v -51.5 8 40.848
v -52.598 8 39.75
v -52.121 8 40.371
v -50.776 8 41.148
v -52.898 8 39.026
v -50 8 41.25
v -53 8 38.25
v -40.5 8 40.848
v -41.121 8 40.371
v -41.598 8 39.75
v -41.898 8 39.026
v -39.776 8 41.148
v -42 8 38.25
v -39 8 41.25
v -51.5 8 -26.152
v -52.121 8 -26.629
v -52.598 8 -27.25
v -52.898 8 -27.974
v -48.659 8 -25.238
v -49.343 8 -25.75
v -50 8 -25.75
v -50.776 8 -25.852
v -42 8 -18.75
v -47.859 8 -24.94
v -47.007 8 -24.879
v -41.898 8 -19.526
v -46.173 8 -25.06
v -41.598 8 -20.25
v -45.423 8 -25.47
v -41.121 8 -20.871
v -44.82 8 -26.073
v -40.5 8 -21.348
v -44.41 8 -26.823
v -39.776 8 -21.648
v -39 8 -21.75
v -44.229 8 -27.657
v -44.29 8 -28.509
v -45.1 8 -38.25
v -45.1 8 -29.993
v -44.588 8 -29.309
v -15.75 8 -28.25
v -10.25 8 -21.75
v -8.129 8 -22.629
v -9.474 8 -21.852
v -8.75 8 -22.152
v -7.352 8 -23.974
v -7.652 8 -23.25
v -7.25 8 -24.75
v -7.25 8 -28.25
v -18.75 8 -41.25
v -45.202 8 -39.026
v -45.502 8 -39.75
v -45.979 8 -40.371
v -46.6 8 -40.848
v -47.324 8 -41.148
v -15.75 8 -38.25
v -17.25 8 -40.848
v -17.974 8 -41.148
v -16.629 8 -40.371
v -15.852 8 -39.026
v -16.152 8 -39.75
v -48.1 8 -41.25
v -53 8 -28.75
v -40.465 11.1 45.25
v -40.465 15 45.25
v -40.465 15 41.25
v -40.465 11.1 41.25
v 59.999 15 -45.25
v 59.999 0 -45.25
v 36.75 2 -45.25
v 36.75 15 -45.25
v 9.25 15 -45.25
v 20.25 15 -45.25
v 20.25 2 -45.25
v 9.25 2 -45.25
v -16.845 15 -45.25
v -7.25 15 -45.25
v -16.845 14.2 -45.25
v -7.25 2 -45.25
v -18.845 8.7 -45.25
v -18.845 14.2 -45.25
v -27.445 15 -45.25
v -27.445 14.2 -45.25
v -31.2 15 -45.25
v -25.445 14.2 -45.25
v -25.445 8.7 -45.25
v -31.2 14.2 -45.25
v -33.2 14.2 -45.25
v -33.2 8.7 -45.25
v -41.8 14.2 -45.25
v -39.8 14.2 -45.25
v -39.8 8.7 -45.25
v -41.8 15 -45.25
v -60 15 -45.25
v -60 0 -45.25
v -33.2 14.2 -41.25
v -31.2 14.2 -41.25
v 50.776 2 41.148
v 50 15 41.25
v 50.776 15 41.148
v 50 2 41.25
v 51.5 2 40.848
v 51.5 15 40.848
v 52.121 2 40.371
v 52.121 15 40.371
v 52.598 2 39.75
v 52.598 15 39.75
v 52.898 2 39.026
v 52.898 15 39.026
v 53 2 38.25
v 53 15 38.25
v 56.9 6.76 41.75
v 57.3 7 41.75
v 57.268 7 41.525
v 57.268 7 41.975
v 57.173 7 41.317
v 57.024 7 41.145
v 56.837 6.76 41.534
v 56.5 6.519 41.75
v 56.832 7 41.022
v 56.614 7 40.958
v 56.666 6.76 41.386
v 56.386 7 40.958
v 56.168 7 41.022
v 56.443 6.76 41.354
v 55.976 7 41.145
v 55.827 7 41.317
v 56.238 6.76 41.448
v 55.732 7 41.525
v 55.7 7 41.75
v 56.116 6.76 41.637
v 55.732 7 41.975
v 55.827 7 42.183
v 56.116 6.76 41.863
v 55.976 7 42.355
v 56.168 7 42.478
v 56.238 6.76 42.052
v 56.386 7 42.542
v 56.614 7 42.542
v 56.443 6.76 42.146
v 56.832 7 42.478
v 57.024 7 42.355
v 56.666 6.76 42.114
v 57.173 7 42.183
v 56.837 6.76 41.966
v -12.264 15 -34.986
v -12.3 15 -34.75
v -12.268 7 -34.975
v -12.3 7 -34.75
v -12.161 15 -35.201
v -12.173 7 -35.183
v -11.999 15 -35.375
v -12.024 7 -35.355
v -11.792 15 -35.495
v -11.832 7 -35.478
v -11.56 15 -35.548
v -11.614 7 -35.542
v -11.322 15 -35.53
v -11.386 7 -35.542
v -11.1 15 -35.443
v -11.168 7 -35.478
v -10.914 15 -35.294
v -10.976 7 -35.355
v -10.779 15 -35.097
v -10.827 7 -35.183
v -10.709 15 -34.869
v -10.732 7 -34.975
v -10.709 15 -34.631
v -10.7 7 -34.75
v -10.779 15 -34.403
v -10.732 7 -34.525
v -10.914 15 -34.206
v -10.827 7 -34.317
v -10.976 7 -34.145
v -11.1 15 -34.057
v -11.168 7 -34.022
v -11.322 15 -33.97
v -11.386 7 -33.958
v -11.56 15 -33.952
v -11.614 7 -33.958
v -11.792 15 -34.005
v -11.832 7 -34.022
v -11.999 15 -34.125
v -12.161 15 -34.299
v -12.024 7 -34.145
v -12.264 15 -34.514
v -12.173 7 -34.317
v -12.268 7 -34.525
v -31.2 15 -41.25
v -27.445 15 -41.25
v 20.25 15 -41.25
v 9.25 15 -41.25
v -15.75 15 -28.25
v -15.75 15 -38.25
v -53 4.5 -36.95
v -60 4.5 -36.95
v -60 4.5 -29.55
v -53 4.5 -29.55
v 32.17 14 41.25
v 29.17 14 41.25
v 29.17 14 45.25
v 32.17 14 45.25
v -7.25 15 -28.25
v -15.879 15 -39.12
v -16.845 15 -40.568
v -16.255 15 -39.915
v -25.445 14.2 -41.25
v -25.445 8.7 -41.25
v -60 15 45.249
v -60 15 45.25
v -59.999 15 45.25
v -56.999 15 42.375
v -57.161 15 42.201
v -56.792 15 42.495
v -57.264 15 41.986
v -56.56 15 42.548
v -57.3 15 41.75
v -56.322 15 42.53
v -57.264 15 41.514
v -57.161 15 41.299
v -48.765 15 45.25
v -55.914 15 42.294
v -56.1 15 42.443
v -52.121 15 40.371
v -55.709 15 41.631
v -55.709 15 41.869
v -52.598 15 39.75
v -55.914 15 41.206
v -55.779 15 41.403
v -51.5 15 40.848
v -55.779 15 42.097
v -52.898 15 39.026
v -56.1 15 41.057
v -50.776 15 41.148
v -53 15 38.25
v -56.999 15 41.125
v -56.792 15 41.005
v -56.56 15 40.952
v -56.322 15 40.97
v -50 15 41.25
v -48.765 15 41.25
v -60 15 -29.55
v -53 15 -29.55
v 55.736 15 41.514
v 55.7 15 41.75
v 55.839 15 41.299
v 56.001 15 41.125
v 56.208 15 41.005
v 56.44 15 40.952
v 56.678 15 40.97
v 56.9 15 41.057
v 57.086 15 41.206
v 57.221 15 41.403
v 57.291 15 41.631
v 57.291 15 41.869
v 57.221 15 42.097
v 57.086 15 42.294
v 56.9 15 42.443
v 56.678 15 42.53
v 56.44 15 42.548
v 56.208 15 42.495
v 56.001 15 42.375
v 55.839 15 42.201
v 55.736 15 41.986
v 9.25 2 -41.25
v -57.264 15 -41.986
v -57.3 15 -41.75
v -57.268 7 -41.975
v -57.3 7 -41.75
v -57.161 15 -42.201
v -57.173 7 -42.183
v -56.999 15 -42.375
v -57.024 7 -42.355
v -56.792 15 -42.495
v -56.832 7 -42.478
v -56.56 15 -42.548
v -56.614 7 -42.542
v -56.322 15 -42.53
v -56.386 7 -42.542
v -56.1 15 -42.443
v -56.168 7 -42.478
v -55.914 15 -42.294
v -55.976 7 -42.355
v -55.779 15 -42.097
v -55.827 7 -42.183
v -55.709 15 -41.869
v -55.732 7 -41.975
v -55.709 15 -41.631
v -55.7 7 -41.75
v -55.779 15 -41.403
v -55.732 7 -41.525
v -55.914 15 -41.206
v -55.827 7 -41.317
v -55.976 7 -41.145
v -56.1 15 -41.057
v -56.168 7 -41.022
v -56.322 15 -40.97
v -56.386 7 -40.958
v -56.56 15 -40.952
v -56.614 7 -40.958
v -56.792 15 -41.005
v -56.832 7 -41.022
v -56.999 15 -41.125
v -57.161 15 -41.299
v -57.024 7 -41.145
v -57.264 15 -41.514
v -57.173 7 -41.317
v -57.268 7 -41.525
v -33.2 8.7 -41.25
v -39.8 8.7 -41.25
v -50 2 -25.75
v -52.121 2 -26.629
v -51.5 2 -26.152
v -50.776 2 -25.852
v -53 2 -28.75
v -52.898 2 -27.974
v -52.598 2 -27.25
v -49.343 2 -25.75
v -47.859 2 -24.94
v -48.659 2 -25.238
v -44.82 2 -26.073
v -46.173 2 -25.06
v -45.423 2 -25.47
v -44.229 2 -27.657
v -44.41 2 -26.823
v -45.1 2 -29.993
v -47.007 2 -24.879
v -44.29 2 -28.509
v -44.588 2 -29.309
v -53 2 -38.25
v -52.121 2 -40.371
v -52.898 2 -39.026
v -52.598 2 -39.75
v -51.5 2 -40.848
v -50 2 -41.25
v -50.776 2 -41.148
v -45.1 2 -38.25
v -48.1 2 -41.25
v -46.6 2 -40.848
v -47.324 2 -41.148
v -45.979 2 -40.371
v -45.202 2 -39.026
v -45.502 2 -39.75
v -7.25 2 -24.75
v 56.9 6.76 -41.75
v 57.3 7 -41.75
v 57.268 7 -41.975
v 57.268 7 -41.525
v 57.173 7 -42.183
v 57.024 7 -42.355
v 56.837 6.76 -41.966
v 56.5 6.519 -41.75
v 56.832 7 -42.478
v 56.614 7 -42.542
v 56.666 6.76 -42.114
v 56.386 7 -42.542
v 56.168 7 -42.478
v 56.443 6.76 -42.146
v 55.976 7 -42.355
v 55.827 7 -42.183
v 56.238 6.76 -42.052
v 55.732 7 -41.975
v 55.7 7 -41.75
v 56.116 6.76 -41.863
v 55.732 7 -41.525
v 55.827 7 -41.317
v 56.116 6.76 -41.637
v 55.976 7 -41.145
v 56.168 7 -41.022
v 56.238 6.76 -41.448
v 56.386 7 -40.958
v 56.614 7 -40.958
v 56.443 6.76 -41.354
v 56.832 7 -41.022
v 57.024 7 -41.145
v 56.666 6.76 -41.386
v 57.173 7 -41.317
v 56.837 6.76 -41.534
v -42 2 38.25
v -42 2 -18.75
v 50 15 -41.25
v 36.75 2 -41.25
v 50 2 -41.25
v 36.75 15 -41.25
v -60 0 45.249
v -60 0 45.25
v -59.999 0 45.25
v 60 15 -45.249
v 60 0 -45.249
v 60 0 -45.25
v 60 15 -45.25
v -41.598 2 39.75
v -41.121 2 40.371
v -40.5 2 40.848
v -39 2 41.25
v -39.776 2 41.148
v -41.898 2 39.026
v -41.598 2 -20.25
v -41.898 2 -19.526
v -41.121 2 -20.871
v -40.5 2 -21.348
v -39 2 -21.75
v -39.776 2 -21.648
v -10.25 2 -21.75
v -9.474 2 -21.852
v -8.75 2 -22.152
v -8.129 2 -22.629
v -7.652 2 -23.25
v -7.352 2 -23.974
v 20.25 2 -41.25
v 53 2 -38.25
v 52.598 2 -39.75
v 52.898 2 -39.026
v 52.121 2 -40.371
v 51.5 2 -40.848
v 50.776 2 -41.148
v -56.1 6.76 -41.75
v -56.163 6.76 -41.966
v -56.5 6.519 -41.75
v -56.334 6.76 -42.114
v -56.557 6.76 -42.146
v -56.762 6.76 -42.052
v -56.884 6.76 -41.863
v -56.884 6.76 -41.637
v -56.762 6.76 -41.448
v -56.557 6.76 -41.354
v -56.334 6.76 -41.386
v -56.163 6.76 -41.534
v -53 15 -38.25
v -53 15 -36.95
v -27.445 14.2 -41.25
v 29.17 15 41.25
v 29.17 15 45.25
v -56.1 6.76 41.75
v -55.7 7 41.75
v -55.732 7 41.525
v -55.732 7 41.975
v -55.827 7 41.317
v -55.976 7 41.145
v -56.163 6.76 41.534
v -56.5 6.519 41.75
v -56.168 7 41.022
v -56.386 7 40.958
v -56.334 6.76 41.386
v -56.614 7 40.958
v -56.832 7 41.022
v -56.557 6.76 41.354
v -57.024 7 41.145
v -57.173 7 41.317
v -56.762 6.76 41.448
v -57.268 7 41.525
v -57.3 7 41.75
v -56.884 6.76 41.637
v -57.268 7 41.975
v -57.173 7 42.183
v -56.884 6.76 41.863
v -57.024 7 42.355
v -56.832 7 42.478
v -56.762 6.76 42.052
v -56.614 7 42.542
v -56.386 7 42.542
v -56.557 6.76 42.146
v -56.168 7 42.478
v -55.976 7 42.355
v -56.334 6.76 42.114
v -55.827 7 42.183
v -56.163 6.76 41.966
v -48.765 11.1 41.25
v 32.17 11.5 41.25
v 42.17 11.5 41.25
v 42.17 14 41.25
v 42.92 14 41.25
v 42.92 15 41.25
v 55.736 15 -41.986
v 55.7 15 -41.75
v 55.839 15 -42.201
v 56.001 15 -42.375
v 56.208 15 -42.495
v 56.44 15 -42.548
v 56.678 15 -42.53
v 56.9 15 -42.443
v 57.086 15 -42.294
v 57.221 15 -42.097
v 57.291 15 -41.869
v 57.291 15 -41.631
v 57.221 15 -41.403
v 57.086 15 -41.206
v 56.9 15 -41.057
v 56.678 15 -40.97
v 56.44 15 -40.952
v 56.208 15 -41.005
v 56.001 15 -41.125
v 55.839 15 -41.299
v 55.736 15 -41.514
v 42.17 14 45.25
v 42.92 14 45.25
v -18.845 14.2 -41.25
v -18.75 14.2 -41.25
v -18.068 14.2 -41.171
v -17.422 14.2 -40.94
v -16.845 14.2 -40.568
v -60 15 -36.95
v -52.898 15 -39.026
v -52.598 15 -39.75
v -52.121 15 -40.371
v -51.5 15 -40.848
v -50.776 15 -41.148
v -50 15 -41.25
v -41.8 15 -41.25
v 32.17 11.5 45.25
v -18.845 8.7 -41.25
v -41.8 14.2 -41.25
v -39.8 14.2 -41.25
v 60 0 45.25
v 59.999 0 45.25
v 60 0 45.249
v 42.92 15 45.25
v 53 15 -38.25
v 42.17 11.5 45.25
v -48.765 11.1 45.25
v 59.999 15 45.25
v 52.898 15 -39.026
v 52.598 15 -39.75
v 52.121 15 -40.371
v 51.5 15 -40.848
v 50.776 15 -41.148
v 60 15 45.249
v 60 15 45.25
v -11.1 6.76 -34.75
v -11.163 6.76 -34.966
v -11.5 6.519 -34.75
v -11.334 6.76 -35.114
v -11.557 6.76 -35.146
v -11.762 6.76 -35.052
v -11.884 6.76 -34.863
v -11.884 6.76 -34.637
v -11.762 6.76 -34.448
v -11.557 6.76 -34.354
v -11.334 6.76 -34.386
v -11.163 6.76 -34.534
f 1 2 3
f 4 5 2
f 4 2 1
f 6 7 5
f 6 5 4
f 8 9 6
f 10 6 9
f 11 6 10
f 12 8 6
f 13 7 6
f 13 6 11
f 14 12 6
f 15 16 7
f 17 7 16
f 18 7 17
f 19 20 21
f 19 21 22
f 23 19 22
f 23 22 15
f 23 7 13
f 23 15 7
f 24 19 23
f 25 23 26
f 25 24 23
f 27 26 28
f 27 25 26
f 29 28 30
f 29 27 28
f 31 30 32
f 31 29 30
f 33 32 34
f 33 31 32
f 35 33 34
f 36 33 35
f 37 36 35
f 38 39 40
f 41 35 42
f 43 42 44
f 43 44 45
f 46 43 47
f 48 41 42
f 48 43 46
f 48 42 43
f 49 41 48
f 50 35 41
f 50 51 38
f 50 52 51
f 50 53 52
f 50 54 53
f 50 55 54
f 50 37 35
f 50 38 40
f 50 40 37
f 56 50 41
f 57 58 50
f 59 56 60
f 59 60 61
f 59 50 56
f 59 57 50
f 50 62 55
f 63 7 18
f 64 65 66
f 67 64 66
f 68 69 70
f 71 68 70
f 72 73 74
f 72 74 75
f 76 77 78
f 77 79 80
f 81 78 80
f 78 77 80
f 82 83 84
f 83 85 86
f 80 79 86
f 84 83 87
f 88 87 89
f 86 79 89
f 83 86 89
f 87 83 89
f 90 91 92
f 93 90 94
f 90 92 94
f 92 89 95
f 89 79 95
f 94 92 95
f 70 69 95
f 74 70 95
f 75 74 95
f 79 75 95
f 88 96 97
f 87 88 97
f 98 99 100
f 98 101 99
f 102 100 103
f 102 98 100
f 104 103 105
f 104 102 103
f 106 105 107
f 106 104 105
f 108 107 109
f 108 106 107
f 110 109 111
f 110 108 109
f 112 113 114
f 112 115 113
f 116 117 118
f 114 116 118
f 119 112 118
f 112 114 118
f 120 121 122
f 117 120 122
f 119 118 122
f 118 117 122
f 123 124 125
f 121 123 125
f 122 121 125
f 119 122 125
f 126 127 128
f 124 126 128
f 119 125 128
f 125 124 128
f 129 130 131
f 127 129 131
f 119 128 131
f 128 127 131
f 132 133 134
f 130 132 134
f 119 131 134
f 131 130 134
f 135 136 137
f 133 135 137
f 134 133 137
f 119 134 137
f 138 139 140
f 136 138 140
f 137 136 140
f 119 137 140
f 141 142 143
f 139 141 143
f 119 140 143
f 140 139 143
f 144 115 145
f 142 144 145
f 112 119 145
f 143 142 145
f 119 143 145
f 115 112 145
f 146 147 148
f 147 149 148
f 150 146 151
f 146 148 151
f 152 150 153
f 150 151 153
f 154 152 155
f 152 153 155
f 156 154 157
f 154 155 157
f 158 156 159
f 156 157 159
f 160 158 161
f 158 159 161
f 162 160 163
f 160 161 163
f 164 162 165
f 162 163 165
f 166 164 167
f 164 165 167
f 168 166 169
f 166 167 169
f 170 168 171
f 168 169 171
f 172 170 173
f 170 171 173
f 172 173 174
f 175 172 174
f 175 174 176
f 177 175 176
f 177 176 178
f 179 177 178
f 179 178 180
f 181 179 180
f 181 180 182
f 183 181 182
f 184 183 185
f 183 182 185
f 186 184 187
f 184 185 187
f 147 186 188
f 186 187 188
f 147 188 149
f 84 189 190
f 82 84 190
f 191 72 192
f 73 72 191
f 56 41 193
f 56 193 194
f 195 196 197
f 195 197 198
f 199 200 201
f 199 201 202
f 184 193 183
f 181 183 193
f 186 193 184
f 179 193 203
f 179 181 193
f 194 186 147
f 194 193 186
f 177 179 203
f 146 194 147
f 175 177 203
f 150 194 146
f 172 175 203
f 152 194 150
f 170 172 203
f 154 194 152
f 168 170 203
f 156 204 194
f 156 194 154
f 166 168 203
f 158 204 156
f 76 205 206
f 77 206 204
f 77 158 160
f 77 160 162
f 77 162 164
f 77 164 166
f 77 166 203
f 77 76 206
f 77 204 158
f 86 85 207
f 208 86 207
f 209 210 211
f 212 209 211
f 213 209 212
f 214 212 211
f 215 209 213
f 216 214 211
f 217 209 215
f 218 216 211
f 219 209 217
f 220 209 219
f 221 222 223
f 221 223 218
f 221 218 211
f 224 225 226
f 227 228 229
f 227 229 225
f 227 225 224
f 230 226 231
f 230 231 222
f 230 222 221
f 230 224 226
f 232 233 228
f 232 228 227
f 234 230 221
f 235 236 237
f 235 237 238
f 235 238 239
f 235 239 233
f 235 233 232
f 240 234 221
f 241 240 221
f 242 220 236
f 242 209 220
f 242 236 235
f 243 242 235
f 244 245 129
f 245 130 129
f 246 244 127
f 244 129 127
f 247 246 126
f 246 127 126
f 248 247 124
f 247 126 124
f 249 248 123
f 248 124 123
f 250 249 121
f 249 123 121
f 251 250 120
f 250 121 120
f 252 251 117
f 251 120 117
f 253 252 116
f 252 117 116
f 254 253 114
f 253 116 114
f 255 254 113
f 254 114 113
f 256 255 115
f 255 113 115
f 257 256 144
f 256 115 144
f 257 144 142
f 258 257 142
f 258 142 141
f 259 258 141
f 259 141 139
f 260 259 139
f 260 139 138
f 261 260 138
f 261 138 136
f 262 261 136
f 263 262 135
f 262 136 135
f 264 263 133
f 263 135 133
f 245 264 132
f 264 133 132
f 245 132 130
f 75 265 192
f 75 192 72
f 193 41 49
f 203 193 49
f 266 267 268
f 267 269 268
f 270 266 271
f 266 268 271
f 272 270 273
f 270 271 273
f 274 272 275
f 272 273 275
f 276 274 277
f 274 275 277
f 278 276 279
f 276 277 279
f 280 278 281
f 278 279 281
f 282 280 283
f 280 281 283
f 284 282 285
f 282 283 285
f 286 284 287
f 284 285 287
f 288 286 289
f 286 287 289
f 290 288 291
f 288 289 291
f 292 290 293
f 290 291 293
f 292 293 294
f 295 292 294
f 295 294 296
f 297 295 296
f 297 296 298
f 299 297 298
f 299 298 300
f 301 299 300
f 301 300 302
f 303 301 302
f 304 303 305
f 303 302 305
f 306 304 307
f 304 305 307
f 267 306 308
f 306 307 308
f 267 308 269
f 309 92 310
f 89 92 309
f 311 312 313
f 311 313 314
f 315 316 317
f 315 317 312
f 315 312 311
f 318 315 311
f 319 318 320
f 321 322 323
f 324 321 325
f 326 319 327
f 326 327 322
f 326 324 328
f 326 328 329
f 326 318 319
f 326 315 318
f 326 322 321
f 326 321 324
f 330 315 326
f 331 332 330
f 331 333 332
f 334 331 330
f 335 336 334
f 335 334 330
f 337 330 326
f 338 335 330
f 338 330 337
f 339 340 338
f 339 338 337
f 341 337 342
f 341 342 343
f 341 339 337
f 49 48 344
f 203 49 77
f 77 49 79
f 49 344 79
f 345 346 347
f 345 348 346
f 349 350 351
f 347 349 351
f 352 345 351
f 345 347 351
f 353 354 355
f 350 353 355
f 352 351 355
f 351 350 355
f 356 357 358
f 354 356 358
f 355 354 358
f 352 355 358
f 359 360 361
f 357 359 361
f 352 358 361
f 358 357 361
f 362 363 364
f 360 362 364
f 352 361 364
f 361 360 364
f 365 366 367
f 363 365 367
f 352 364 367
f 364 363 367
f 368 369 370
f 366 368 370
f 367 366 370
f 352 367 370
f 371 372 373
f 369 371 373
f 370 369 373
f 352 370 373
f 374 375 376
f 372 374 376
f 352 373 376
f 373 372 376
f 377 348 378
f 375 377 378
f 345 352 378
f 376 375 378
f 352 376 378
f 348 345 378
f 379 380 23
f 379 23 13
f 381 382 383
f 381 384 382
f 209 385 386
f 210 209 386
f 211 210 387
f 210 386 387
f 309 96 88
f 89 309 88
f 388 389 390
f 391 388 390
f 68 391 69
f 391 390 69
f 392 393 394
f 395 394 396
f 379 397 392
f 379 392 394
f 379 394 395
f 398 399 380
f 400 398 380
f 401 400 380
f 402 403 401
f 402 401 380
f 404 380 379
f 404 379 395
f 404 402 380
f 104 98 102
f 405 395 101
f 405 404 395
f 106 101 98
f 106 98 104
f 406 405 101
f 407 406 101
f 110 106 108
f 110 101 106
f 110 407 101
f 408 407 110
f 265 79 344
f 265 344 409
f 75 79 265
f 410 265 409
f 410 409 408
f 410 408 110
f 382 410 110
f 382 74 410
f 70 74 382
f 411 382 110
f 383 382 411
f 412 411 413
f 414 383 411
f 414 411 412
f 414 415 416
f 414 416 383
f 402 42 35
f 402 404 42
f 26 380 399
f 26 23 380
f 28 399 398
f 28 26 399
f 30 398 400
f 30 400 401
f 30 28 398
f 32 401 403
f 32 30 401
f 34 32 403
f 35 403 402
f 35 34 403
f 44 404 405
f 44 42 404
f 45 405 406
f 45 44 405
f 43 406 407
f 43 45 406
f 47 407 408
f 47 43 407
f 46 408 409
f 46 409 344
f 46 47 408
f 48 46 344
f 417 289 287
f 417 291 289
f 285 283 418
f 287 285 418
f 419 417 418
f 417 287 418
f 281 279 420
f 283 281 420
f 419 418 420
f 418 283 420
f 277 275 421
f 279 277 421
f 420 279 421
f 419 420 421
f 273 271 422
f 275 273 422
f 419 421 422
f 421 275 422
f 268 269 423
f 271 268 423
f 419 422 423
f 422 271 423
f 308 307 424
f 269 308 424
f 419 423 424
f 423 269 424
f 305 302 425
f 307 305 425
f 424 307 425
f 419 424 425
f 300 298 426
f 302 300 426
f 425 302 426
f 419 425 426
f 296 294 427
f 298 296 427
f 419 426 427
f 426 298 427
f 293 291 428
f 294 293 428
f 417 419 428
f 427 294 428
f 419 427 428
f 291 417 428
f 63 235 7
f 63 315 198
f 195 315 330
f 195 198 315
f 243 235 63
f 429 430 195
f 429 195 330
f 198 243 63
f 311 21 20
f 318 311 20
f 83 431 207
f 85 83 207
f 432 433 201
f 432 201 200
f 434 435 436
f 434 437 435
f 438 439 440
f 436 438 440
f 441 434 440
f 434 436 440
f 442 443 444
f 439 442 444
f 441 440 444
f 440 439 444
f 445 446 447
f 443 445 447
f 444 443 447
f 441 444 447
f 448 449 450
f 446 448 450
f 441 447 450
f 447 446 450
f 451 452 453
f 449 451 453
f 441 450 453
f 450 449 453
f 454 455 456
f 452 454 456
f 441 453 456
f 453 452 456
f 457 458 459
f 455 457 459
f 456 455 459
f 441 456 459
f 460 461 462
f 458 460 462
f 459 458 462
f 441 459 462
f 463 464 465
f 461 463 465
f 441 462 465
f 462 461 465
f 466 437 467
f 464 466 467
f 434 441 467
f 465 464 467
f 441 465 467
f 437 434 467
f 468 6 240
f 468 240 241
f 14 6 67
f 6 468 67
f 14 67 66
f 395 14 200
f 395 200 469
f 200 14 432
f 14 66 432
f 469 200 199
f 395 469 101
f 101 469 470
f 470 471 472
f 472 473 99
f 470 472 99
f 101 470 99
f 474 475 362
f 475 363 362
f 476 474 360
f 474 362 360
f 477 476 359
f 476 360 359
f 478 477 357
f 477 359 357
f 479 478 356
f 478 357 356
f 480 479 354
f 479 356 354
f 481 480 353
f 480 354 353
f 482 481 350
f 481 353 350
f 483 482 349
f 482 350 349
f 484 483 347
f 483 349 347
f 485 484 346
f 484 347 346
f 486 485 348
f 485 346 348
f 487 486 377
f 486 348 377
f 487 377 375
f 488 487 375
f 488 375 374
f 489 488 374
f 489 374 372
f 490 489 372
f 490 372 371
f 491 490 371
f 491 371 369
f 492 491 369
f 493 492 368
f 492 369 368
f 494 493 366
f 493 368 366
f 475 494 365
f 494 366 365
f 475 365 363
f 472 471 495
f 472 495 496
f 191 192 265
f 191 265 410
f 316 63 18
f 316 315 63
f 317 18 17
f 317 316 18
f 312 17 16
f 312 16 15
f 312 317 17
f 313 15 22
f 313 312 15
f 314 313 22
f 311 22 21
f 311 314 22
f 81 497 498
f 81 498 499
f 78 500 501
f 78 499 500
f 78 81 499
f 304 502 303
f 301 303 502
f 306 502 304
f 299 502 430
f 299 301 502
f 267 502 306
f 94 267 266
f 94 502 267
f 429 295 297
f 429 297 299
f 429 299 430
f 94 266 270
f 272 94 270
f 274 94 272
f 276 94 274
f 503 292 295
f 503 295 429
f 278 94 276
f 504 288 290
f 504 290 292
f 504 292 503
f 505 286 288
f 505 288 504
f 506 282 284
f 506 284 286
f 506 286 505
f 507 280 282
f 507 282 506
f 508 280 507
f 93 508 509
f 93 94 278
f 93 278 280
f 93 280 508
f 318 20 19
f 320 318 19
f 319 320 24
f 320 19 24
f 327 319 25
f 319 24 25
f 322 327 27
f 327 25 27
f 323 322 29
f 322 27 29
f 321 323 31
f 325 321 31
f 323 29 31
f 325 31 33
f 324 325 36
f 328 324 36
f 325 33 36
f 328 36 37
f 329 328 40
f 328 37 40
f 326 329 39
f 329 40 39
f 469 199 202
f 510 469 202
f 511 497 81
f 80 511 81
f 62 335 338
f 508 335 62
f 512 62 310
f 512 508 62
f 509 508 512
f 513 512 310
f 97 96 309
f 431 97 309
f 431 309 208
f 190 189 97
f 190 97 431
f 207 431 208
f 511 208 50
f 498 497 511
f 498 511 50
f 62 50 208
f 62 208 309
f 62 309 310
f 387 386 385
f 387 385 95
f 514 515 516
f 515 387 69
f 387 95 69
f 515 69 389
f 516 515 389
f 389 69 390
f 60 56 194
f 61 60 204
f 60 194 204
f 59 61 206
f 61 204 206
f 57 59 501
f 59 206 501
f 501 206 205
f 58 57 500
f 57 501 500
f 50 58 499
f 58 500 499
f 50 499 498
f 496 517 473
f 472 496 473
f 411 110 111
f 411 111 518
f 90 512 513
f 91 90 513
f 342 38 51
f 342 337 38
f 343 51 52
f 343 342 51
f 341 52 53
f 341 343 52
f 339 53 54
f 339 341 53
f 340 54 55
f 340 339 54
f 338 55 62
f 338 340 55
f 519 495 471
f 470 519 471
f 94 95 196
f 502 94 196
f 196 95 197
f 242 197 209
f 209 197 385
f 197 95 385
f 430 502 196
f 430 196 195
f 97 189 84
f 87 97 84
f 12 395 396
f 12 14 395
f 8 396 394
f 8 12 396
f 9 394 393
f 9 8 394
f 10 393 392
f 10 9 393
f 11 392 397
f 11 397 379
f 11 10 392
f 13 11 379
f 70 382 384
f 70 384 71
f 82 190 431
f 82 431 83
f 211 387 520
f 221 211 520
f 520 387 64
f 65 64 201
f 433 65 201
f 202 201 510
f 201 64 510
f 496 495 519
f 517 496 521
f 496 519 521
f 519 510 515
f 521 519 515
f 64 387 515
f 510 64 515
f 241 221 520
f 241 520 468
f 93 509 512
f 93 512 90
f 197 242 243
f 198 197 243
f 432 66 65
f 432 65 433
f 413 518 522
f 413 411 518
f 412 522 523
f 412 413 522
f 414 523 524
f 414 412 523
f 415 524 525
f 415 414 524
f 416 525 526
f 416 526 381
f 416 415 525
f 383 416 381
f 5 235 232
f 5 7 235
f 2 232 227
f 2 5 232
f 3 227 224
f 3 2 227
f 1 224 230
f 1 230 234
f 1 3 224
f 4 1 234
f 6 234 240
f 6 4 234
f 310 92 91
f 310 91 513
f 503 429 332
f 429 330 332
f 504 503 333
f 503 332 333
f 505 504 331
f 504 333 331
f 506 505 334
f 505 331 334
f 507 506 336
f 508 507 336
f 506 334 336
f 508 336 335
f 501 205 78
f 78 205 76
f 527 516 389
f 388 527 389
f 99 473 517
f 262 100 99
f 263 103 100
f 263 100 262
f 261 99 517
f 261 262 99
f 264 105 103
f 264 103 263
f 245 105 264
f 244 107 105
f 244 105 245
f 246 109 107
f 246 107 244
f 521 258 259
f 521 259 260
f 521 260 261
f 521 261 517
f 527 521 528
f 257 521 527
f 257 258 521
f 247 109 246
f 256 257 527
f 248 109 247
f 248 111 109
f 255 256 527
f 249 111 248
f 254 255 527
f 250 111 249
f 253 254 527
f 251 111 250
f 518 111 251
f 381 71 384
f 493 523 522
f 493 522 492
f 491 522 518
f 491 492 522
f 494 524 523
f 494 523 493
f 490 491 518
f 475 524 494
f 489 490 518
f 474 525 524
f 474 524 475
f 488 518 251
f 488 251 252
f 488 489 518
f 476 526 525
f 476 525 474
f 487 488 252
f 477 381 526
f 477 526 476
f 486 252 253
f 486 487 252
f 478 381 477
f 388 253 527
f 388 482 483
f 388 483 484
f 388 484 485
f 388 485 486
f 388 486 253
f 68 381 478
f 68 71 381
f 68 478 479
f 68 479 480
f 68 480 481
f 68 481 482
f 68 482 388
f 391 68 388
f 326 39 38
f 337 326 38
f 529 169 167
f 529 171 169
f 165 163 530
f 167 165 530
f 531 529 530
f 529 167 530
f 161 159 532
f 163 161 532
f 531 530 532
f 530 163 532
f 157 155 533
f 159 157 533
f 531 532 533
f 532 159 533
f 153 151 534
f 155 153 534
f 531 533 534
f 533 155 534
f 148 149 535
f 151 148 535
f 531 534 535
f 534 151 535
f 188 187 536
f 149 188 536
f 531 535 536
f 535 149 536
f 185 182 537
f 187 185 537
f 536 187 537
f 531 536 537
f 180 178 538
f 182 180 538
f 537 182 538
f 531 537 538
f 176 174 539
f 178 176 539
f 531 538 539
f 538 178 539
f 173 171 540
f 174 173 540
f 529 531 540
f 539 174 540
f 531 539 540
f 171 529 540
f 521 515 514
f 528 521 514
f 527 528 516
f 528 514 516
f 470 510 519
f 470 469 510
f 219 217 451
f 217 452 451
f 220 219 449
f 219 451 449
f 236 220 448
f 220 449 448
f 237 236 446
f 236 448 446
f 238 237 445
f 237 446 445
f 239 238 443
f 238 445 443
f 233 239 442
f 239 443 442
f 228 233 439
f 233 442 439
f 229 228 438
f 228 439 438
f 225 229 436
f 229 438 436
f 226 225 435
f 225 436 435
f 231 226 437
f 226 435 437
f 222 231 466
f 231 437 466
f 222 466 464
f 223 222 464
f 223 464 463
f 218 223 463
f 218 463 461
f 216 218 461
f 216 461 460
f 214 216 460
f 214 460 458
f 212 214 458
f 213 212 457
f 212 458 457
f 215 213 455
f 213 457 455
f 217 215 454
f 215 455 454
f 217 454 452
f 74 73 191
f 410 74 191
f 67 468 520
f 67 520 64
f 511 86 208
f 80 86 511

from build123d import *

# Parameters (mm, degrees)
SKETCH_1_R                  = 0.0001
EXTRUDE_3486_DEPTH          = 15
SKETCH_3_W                  = 106
SKETCH_3_H                  = 82.5
CUT_EXTRUDE_5664_DEPTH      = 7
PHONEJACK_CENTER_DEPTH      = 6.3
SKETCH_2_10_W               = 10.6
SKETCH_2_10_H               = 13.1
PHONEJACK_PADS_DEPTH        = 0.8
MICJACK_START               = -13
MICJACK_DEPTH               = 13
ENCODER_BODY_DEPTH          = 13
SKETCH_2_13_W               = 7
SKETCH_2_13_H               = 7.4
ENCODER_SHAFT_DEPTH         = 10.5
SKETCH_2_14_W               = 8.3
SKETCH_2_14_H               = 5
SW_DEPTH                    = 3.9
USB_DEPTH                   = 3.5
SKETCH_2_16_W               = 11.5
SKETCH_2_16_H               = 8
SKETCH_2_16_W_2             = 3
USB_PADS_DEPTH              = 1
HOLE_WIZARD_8269_D          = 1.6
HOLE_WIZARD_8269_DEPTH      = 8
HOLE_WIZARD_8269_TIP        = 0.480688495
SKETCH_15_W                 = 8.5
SKETCH_15_H                 = 13
EXTRUDE_11487_DEPTH         = 7
HOLE_WIZARD_1_6_1_6_1_D     = 1.6
HOLE_WIZARD_1_6_1_6_1_DEPTH = 8
HOLE_WIZARD_1_6_1_6_1_TIP   = 0.480688495
CUT_EXTRUDE_START           = -13
CUT_EXTRUDE_12334_DEPTH     = 13
CUT_EXTRUDE_12754_DEPTH     = 13
FILLET_2_R                  = 3


# Read off the part's stored shape, not the designer's step: micjack
with BuildPart() as part:
    # 草图1 → Extrude 3486 (new body)
    with BuildSketch(Plane(origin=(0, 0, 0), x_dir=(1, 0, 0), z_dir=(0, 1, 0))):
        with Locations((-59.9999, 45.2499)):
            Circle(SKETCH_1_R)
        with BuildLine():
            Line((-59.999, -45.25), (59.999, -45.25))
            ThreePointArc((59.999, -45.25), (59.999707107, -45.249707107), (60, -45.249))
            Line((60, -45.249), (60, 45.249))
            ThreePointArc((60, 45.249), (59.999707107, 45.249707107), (59.999, 45.25))
            Line((59.999, 45.25), (-60, 45.2499))
            Line((-60, 45.2499), (-60, -45.249))
            ThreePointArc((-60, -45.249), (-59.999707107, -45.249707107), (-59.999, -45.25))
        make_face()
    extrude(amount=EXTRUDE_3486_DEPTH)

    # 草图3 → Cut-Extrude 5664 (cut)
    with BuildSketch(Plane(origin=(0, 15, 0), x_dir=(1, 0, 0), z_dir=(0, 1, 0))):
        Rectangle(SKETCH_3_W, SKETCH_3_H)
    extrude(amount=-CUT_EXTRUDE_5664_DEPTH, mode=Mode.SUBTRACT)

    # 草图2 → phonejack_center (cut)
    with BuildSketch(Plane(origin=(0, 15, 0), x_dir=(1, 0, 0), z_dir=(0, 1, 0))):
        Polygon((-18.845, 45.25), (-25.445, 45.25), (-25.445, 34.892640687), (-25.445, 32.15), (-18.845, 32.15), (-18.845, 34.892640687), align=None)
        with BuildLine():
            Line((-25.445, 32.15), (-25.445, 34.892640687))
            ThreePointArc((-25.445, 34.892640687), (-26.199788077, 33.62454971), (-26.258634687, 32.15))
            Line((-26.258634687, 32.15), (-25.445, 32.15))
        make_face()
        with BuildLine():
            Line((-25.445, 32.15), (-26.258634687, 32.15))
            ThreePointArc((-26.258634687, 32.15), (-25.960719695, 31.340928846), (-25.445, 30.65))
            Line((-25.445, 30.65), (-25.445, 32.15))
        make_face()
        with BuildLine():
            Line((-23.087640687, 30.65), (-25.445, 30.65))
            ThreePointArc((-25.445, 30.65), (-23.892646037, 29.825768229), (-22.145, 30.012568041))
            ThreePointArc((-22.145, 30.012568041), (-22.646820232, 30.286180483), (-23.087640687, 30.65))
        make_face()
        with BuildLine():
            Line((-21.202359313, 30.65), (-23.087640687, 30.65))
            ThreePointArc((-23.087640687, 30.65), (-22.646820232, 30.286180483), (-22.145, 30.012568041))
            ThreePointArc((-22.145, 30.012568041), (-21.643179768, 30.286180483), (-21.202359313, 30.65))
        make_face()
        with BuildLine():
            ThreePointArc((-21.202359313, 30.65), (-21.643179768, 30.286180483), (-22.145, 30.012568041))
            ThreePointArc((-22.145, 30.012568041), (-20.397353963, 29.825768229), (-18.845, 30.65))
            Line((-18.845, 30.65), (-21.202359313, 30.65))
        make_face()
        with BuildLine():
            ThreePointArc((-18.031365313, 32.15), (-18.090211923, 33.62454971), (-18.845, 34.892640687))
            Line((-18.845, 34.892640687), (-18.845, 32.15))
            Line((-18.845, 32.15), (-18.031365313, 32.15))
        make_face()
        with BuildLine():
            Line((-18.031365313, 32.15), (-18.845, 32.15))
            Line((-18.845, 32.15), (-18.845, 30.65))
            ThreePointArc((-18.845, 30.65), (-18.329280305, 31.340928846), (-18.031365313, 32.15))
        make_face()
        Polygon((-18.845, 32.15), (-25.445, 32.15), (-25.445, 30.65), (-23.087640687, 30.65), (-21.202359313, 30.65), (-18.845, 30.65), align=None)
        Polygon((-33.2, 45.25), (-39.8, 45.25), (-39.8, 34.892640687), (-39.8, 32.15), (-33.2, 32.15), (-33.2, 34.892640687), align=None)
        with BuildLine():
            Line((-39.8, 32.15), (-39.8, 34.892640687))
            ThreePointArc((-39.8, 34.892640687), (-40.554788077, 33.62454971), (-40.613634687, 32.15))
            Line((-40.613634687, 32.15), (-39.8, 32.15))
        make_face()
        with BuildLine():
            Line((-39.8, 30.65), (-39.8, 32.15))
            Line((-39.8, 32.15), (-40.613634687, 32.15))
            ThreePointArc((-40.613634687, 32.15), (-40.315719695, 31.340928846), (-39.8, 30.65))
        make_face()
        with BuildLine():
            Line((-37.442640687, 30.65), (-39.8, 30.65))
            ThreePointArc((-39.8, 30.65), (-38.247646037, 29.825768229), (-36.5, 30.012568041))
            ThreePointArc((-36.5, 30.012568041), (-37.001820232, 30.286180483), (-37.442640687, 30.65))
        make_face()
        with BuildLine():
            ThreePointArc((-36.5, 30.012568041), (-34.752353963, 29.825768229), (-33.2, 30.65))
            Line((-33.2, 30.65), (-35.557359313, 30.65))
            ThreePointArc((-35.557359313, 30.65), (-35.998179768, 30.286180483), (-36.5, 30.012568041))
        make_face()
        with BuildLine():
            Line((-35.557359313, 30.65), (-37.442640687, 30.65))
            ThreePointArc((-37.442640687, 30.65), (-37.001820232, 30.286180483), (-36.5, 30.012568041))
            ThreePointArc((-36.5, 30.012568041), (-35.998179768, 30.286180483), (-35.557359313, 30.65))
        make_face()
        Polygon((-33.2, 32.15), (-39.8, 32.15), (-39.8, 30.65), (-37.442640687, 30.65), (-35.557359313, 30.65), (-33.2, 30.65), align=None)
        with BuildLine():
            ThreePointArc((-32.386365313, 32.15), (-32.445211923, 33.62454971), (-33.2, 34.892640687))
            Line((-33.2, 34.892640687), (-33.2, 32.15))
            Line((-33.2, 32.15), (-32.386365313, 32.15))
        make_face()
        with BuildLine():
            Line((-32.386365313, 32.15), (-33.2, 32.15))
            Line((-33.2, 32.15), (-33.2, 30.65))
            ThreePointArc((-33.2, 30.65), (-32.684280305, 31.340928846), (-32.386365313, 32.15))
        make_face()
    extrude(amount=-PHONEJACK_CENTER_DEPTH, mode=Mode.SUBTRACT)

    # 草图2<10> → phonejack_pads (cut)
    with BuildSketch(Plane(origin=(0, 15, 0), x_dir=(1, 0, 0), z_dir=(0, 1, 0))):
        with Locations((-36.5, 38.7)):
            Rectangle(SKETCH_2_10_W, SKETCH_2_10_H)
        with Locations((-22.145, 38.7)):
            Rectangle(SKETCH_2_10_W, SKETCH_2_10_H)
    extrude(amount=-PHONEJACK_PADS_DEPTH, mode=Mode.SUBTRACT)

    # micjack outline → micjack (cut)
    with BuildSketch(Plane(origin=(0, 15, 0), x_dir=(1, 0, 0), z_dir=(0, 1, 0)).offset(MICJACK_START)):
        with BuildLine():
            Line((53, 21.75), (53, 41.25))
            Line((53, 41.25), (36.75, 41.25))
            Line((36.75, 41.25), (36.75, 45.25))
            Line((36.75, 45.25), (20.25, 45.25))
            Line((20.25, 45.25), (20.25, 23.492640687))
            ThreePointArc((20.25, 23.492640687), (20.25, 19.25), (24.492640687, 19.25))
            Line((24.492640687, 19.25), (33.921572875, 19.25))
            ThreePointArc((33.921572875, 19.25), (36.592809886, 19.108613341), (37.015389906, 21.75))
            Line((37.015389906, 21.75), (53, 21.75))
        make_face()
        with BuildLine():
            Line((-7.25, 45.25), (-7.25, 21.75))
            Line((-7.25, 21.75), (-8.104683977, 21.75))
            ThreePointArc((-8.104683977, 21.75), (-6.449710003, 18.677832117), (-3.007359313, 19.25))
            Line((-3.007359313, 19.25), (5.007359313, 19.25))
            ThreePointArc((5.007359313, 19.25), (9.25, 19.25), (9.25, 23.492640687))
            Line((9.25, 23.492640687), (9.25, 45.25))
            Line((9.25, 45.25), (-7.25, 45.25))
        make_face()
    extrude(amount=MICJACK_DEPTH, mode=Mode.SUBTRACT)

    # 草图2<12> → encoder_body (cut)
    with BuildSketch(Plane(origin=(0, 15, 0), x_dir=(1, 0, 0), z_dir=(0, 1, 0))):
        with BuildLine():
            Line((-53, 41.25), (-53, 25.75))
            Line((-53, 25.75), (-49.342640687, 25.75))
            ThreePointArc((-49.342640687, 25.75), (-45.1, 25.75), (-45.1, 29.992640687))
            Line((-45.1, 29.992640687), (-45.1, 41.25))
            Line((-45.1, 41.25), (-53, 41.25))
        make_face()
    extrude(amount=-ENCODER_BODY_DEPTH, mode=Mode.SUBTRACT)

    # 草图2<13> → encoder_shaft (cut)
    with BuildSketch(Plane(origin=(0, 15, 0), x_dir=(1, 0, 0), z_dir=(0, 1, 0))):
        with Locations((-56.5, 33.25)):
            Rectangle(SKETCH_2_13_W, SKETCH_2_13_H)
    extrude(amount=-ENCODER_SHAFT_DEPTH, mode=Mode.SUBTRACT)

    # 草图2<14> → sw (cut)
    with BuildSketch(Plane(origin=(0, 15, 0), x_dir=(1, 0, 0), z_dir=(0, 1, 0))):
        with Locations((-44.615, -42.75)):
            Rectangle(SKETCH_2_14_W, SKETCH_2_14_H)
    extrude(amount=-SW_DEPTH, mode=Mode.SUBTRACT)

    # 草图2<15> → USB (cut)
    with BuildSketch(Plane(origin=(0, 15, 0), x_dir=(1, 0, 0), z_dir=(0, 1, 0))):
        Polygon((32.17, -41.492640687), (32.17, -45.25), (42.17, -45.25), (42.17, -41.492640687), (42.17, -41.25), (32.17, -41.25), align=None)
    extrude(amount=-USB_DEPTH, mode=Mode.SUBTRACT)

    # 草图2<16> → USB_pads (cut)
    with BuildSketch(Plane(origin=(0, 15, 0), x_dir=(1, 0, 0), z_dir=(0, 1, 0))):
        with Locations((37.17, -41.25)):
            Rectangle(SKETCH_2_16_W, SKETCH_2_16_H)
        with Locations((30.67, -41.25)):
            Rectangle(SKETCH_2_16_W_2, SKETCH_2_16_H)
    extrude(amount=-USB_PADS_DEPTH, mode=Mode.SUBTRACT)

    # Hole Wizard 8269
    with Locations(Plane(origin=(0, 15, 0), x_dir=(1, 0, 0), z_dir=(0, 1, 0))):
        with Locations((56.5, -41.75), (56.5, 41.75), (-56.5, 41.75), (-56.5, -41.75)):
            Hole(HOLE_WIZARD_8269_D / 2, depth=HOLE_WIZARD_8269_DEPTH)
            with Locations((0, 0, -(HOLE_WIZARD_8269_DEPTH + HOLE_WIZARD_8269_TIP / 2))):  # 118° drill point
                Cone(0, HOLE_WIZARD_8269_D / 2, HOLE_WIZARD_8269_TIP, mode=Mode.SUBTRACT)

    # 草图15 → Extrude 11487 (add)
    with BuildSketch(Plane(origin=(0, 8, 0), x_dir=(1, 0, 0), z_dir=(0, 1, 0))):
        with Locations((-11.5, 34.75)):
            Rectangle(SKETCH_15_W, SKETCH_15_H)
    extrude(amount=EXTRUDE_11487_DEPTH)

    # Ø1.6 (1.6) 直径孔1
    with Locations(Plane(origin=(0, 15, 0), x_dir=(1, 0, 0), z_dir=(0, 1, 0))):
        with Locations((-11.5, 34.75)):
            Hole(HOLE_WIZARD_1_6_1_6_1_D / 2, depth=HOLE_WIZARD_1_6_1_6_1_DEPTH)
            with Locations((0, 0, -(HOLE_WIZARD_1_6_1_6_1_DEPTH + HOLE_WIZARD_1_6_1_6_1_TIP / 2))):  # 118° drill point
                Cone(0, HOLE_WIZARD_1_6_1_6_1_D / 2, HOLE_WIZARD_1_6_1_6_1_TIP, mode=Mode.SUBTRACT)

    # 草图2<18> → Cut-Extrude 12334 (cut)
    with BuildSketch(Plane(origin=(0, 15, 0), x_dir=(1, 0, 0), z_dir=(0, 1, 0)).offset(CUT_EXTRUDE_START)):
        with BuildLine():
            Line((53, -41.25), (53, 21.75))
            Line((53, 21.75), (37.015389906, 21.75))
            ThreePointArc((37.015389906, 21.75), (36.592809886, 19.108613341), (33.921572875, 19.25))
            Line((33.921572875, 19.25), (24.492640687, 19.25))
            ThreePointArc((24.492640687, 19.25), (21.050289997, 18.677832117), (19.395316023, 21.75))
            Line((19.395316023, 21.75), (10.104683977, 21.75))
            ThreePointArc((10.104683977, 21.75), (8.449710003, 18.677832117), (5.007359313, 19.25))
            Line((5.007359313, 19.25), (-3.007359313, 19.25))
            ThreePointArc((-3.007359313, 19.25), (-6.449710003, 18.677832117), (-8.104683977, 21.75))
            Line((-8.104683977, 21.75), (-42, 21.75))
            Line((-42, 21.75), (-42, -41.25))
            Line((-42, -41.25), (53, -41.25))
        make_face()
    extrude(amount=CUT_EXTRUDE_12334_DEPTH, mode=Mode.SUBTRACT)

    # 草图2<20> → Cut-Extrude 12754 (cut)
    with BuildSketch(Plane(origin=(0, 15, 0), x_dir=(1, 0, 0), z_dir=(0, 1, 0)).offset(CUT_EXTRUDE_START)):
        with BuildLine():
            ThreePointArc((19.395316023, 21.75), (19.677832117, 22.69235069), (20.25, 23.492640687))
            Line((20.25, 23.492640687), (20.25, 41.25))
            Line((20.25, 41.25), (9.25, 41.25))
            Line((9.25, 41.25), (9.25, 23.492640687))
            ThreePointArc((9.25, 23.492640687), (9.822167883, 22.69235069), (10.104683977, 21.75))
            Line((10.104683977, 21.75), (19.395316023, 21.75))
        make_face()
    extrude(amount=CUT_EXTRUDE_12754_DEPTH, mode=Mode.SUBTRACT)

    # 圆角2
    fillet_2_edges = [part.edges().sort_by_distance(p)[0] for p in [
        (-7.25, 5, -21.75),
        (53, 8.5, -41.25),
        (53, 8.5, 41.25),
        (-53, 5, -25.75),
        (-42, 5, -21.75),
        (-42, 5, 41.25),
        (-53, 11.5, 41.25),
        (-53, 8.5, -41.25),
        (-15.75, 11.5, -41.25),
        (-45.1, 5, -41.25),
    ]]
    fillet(fillet_2_edges, radius=FILLET_2_R)


solid = part.part
